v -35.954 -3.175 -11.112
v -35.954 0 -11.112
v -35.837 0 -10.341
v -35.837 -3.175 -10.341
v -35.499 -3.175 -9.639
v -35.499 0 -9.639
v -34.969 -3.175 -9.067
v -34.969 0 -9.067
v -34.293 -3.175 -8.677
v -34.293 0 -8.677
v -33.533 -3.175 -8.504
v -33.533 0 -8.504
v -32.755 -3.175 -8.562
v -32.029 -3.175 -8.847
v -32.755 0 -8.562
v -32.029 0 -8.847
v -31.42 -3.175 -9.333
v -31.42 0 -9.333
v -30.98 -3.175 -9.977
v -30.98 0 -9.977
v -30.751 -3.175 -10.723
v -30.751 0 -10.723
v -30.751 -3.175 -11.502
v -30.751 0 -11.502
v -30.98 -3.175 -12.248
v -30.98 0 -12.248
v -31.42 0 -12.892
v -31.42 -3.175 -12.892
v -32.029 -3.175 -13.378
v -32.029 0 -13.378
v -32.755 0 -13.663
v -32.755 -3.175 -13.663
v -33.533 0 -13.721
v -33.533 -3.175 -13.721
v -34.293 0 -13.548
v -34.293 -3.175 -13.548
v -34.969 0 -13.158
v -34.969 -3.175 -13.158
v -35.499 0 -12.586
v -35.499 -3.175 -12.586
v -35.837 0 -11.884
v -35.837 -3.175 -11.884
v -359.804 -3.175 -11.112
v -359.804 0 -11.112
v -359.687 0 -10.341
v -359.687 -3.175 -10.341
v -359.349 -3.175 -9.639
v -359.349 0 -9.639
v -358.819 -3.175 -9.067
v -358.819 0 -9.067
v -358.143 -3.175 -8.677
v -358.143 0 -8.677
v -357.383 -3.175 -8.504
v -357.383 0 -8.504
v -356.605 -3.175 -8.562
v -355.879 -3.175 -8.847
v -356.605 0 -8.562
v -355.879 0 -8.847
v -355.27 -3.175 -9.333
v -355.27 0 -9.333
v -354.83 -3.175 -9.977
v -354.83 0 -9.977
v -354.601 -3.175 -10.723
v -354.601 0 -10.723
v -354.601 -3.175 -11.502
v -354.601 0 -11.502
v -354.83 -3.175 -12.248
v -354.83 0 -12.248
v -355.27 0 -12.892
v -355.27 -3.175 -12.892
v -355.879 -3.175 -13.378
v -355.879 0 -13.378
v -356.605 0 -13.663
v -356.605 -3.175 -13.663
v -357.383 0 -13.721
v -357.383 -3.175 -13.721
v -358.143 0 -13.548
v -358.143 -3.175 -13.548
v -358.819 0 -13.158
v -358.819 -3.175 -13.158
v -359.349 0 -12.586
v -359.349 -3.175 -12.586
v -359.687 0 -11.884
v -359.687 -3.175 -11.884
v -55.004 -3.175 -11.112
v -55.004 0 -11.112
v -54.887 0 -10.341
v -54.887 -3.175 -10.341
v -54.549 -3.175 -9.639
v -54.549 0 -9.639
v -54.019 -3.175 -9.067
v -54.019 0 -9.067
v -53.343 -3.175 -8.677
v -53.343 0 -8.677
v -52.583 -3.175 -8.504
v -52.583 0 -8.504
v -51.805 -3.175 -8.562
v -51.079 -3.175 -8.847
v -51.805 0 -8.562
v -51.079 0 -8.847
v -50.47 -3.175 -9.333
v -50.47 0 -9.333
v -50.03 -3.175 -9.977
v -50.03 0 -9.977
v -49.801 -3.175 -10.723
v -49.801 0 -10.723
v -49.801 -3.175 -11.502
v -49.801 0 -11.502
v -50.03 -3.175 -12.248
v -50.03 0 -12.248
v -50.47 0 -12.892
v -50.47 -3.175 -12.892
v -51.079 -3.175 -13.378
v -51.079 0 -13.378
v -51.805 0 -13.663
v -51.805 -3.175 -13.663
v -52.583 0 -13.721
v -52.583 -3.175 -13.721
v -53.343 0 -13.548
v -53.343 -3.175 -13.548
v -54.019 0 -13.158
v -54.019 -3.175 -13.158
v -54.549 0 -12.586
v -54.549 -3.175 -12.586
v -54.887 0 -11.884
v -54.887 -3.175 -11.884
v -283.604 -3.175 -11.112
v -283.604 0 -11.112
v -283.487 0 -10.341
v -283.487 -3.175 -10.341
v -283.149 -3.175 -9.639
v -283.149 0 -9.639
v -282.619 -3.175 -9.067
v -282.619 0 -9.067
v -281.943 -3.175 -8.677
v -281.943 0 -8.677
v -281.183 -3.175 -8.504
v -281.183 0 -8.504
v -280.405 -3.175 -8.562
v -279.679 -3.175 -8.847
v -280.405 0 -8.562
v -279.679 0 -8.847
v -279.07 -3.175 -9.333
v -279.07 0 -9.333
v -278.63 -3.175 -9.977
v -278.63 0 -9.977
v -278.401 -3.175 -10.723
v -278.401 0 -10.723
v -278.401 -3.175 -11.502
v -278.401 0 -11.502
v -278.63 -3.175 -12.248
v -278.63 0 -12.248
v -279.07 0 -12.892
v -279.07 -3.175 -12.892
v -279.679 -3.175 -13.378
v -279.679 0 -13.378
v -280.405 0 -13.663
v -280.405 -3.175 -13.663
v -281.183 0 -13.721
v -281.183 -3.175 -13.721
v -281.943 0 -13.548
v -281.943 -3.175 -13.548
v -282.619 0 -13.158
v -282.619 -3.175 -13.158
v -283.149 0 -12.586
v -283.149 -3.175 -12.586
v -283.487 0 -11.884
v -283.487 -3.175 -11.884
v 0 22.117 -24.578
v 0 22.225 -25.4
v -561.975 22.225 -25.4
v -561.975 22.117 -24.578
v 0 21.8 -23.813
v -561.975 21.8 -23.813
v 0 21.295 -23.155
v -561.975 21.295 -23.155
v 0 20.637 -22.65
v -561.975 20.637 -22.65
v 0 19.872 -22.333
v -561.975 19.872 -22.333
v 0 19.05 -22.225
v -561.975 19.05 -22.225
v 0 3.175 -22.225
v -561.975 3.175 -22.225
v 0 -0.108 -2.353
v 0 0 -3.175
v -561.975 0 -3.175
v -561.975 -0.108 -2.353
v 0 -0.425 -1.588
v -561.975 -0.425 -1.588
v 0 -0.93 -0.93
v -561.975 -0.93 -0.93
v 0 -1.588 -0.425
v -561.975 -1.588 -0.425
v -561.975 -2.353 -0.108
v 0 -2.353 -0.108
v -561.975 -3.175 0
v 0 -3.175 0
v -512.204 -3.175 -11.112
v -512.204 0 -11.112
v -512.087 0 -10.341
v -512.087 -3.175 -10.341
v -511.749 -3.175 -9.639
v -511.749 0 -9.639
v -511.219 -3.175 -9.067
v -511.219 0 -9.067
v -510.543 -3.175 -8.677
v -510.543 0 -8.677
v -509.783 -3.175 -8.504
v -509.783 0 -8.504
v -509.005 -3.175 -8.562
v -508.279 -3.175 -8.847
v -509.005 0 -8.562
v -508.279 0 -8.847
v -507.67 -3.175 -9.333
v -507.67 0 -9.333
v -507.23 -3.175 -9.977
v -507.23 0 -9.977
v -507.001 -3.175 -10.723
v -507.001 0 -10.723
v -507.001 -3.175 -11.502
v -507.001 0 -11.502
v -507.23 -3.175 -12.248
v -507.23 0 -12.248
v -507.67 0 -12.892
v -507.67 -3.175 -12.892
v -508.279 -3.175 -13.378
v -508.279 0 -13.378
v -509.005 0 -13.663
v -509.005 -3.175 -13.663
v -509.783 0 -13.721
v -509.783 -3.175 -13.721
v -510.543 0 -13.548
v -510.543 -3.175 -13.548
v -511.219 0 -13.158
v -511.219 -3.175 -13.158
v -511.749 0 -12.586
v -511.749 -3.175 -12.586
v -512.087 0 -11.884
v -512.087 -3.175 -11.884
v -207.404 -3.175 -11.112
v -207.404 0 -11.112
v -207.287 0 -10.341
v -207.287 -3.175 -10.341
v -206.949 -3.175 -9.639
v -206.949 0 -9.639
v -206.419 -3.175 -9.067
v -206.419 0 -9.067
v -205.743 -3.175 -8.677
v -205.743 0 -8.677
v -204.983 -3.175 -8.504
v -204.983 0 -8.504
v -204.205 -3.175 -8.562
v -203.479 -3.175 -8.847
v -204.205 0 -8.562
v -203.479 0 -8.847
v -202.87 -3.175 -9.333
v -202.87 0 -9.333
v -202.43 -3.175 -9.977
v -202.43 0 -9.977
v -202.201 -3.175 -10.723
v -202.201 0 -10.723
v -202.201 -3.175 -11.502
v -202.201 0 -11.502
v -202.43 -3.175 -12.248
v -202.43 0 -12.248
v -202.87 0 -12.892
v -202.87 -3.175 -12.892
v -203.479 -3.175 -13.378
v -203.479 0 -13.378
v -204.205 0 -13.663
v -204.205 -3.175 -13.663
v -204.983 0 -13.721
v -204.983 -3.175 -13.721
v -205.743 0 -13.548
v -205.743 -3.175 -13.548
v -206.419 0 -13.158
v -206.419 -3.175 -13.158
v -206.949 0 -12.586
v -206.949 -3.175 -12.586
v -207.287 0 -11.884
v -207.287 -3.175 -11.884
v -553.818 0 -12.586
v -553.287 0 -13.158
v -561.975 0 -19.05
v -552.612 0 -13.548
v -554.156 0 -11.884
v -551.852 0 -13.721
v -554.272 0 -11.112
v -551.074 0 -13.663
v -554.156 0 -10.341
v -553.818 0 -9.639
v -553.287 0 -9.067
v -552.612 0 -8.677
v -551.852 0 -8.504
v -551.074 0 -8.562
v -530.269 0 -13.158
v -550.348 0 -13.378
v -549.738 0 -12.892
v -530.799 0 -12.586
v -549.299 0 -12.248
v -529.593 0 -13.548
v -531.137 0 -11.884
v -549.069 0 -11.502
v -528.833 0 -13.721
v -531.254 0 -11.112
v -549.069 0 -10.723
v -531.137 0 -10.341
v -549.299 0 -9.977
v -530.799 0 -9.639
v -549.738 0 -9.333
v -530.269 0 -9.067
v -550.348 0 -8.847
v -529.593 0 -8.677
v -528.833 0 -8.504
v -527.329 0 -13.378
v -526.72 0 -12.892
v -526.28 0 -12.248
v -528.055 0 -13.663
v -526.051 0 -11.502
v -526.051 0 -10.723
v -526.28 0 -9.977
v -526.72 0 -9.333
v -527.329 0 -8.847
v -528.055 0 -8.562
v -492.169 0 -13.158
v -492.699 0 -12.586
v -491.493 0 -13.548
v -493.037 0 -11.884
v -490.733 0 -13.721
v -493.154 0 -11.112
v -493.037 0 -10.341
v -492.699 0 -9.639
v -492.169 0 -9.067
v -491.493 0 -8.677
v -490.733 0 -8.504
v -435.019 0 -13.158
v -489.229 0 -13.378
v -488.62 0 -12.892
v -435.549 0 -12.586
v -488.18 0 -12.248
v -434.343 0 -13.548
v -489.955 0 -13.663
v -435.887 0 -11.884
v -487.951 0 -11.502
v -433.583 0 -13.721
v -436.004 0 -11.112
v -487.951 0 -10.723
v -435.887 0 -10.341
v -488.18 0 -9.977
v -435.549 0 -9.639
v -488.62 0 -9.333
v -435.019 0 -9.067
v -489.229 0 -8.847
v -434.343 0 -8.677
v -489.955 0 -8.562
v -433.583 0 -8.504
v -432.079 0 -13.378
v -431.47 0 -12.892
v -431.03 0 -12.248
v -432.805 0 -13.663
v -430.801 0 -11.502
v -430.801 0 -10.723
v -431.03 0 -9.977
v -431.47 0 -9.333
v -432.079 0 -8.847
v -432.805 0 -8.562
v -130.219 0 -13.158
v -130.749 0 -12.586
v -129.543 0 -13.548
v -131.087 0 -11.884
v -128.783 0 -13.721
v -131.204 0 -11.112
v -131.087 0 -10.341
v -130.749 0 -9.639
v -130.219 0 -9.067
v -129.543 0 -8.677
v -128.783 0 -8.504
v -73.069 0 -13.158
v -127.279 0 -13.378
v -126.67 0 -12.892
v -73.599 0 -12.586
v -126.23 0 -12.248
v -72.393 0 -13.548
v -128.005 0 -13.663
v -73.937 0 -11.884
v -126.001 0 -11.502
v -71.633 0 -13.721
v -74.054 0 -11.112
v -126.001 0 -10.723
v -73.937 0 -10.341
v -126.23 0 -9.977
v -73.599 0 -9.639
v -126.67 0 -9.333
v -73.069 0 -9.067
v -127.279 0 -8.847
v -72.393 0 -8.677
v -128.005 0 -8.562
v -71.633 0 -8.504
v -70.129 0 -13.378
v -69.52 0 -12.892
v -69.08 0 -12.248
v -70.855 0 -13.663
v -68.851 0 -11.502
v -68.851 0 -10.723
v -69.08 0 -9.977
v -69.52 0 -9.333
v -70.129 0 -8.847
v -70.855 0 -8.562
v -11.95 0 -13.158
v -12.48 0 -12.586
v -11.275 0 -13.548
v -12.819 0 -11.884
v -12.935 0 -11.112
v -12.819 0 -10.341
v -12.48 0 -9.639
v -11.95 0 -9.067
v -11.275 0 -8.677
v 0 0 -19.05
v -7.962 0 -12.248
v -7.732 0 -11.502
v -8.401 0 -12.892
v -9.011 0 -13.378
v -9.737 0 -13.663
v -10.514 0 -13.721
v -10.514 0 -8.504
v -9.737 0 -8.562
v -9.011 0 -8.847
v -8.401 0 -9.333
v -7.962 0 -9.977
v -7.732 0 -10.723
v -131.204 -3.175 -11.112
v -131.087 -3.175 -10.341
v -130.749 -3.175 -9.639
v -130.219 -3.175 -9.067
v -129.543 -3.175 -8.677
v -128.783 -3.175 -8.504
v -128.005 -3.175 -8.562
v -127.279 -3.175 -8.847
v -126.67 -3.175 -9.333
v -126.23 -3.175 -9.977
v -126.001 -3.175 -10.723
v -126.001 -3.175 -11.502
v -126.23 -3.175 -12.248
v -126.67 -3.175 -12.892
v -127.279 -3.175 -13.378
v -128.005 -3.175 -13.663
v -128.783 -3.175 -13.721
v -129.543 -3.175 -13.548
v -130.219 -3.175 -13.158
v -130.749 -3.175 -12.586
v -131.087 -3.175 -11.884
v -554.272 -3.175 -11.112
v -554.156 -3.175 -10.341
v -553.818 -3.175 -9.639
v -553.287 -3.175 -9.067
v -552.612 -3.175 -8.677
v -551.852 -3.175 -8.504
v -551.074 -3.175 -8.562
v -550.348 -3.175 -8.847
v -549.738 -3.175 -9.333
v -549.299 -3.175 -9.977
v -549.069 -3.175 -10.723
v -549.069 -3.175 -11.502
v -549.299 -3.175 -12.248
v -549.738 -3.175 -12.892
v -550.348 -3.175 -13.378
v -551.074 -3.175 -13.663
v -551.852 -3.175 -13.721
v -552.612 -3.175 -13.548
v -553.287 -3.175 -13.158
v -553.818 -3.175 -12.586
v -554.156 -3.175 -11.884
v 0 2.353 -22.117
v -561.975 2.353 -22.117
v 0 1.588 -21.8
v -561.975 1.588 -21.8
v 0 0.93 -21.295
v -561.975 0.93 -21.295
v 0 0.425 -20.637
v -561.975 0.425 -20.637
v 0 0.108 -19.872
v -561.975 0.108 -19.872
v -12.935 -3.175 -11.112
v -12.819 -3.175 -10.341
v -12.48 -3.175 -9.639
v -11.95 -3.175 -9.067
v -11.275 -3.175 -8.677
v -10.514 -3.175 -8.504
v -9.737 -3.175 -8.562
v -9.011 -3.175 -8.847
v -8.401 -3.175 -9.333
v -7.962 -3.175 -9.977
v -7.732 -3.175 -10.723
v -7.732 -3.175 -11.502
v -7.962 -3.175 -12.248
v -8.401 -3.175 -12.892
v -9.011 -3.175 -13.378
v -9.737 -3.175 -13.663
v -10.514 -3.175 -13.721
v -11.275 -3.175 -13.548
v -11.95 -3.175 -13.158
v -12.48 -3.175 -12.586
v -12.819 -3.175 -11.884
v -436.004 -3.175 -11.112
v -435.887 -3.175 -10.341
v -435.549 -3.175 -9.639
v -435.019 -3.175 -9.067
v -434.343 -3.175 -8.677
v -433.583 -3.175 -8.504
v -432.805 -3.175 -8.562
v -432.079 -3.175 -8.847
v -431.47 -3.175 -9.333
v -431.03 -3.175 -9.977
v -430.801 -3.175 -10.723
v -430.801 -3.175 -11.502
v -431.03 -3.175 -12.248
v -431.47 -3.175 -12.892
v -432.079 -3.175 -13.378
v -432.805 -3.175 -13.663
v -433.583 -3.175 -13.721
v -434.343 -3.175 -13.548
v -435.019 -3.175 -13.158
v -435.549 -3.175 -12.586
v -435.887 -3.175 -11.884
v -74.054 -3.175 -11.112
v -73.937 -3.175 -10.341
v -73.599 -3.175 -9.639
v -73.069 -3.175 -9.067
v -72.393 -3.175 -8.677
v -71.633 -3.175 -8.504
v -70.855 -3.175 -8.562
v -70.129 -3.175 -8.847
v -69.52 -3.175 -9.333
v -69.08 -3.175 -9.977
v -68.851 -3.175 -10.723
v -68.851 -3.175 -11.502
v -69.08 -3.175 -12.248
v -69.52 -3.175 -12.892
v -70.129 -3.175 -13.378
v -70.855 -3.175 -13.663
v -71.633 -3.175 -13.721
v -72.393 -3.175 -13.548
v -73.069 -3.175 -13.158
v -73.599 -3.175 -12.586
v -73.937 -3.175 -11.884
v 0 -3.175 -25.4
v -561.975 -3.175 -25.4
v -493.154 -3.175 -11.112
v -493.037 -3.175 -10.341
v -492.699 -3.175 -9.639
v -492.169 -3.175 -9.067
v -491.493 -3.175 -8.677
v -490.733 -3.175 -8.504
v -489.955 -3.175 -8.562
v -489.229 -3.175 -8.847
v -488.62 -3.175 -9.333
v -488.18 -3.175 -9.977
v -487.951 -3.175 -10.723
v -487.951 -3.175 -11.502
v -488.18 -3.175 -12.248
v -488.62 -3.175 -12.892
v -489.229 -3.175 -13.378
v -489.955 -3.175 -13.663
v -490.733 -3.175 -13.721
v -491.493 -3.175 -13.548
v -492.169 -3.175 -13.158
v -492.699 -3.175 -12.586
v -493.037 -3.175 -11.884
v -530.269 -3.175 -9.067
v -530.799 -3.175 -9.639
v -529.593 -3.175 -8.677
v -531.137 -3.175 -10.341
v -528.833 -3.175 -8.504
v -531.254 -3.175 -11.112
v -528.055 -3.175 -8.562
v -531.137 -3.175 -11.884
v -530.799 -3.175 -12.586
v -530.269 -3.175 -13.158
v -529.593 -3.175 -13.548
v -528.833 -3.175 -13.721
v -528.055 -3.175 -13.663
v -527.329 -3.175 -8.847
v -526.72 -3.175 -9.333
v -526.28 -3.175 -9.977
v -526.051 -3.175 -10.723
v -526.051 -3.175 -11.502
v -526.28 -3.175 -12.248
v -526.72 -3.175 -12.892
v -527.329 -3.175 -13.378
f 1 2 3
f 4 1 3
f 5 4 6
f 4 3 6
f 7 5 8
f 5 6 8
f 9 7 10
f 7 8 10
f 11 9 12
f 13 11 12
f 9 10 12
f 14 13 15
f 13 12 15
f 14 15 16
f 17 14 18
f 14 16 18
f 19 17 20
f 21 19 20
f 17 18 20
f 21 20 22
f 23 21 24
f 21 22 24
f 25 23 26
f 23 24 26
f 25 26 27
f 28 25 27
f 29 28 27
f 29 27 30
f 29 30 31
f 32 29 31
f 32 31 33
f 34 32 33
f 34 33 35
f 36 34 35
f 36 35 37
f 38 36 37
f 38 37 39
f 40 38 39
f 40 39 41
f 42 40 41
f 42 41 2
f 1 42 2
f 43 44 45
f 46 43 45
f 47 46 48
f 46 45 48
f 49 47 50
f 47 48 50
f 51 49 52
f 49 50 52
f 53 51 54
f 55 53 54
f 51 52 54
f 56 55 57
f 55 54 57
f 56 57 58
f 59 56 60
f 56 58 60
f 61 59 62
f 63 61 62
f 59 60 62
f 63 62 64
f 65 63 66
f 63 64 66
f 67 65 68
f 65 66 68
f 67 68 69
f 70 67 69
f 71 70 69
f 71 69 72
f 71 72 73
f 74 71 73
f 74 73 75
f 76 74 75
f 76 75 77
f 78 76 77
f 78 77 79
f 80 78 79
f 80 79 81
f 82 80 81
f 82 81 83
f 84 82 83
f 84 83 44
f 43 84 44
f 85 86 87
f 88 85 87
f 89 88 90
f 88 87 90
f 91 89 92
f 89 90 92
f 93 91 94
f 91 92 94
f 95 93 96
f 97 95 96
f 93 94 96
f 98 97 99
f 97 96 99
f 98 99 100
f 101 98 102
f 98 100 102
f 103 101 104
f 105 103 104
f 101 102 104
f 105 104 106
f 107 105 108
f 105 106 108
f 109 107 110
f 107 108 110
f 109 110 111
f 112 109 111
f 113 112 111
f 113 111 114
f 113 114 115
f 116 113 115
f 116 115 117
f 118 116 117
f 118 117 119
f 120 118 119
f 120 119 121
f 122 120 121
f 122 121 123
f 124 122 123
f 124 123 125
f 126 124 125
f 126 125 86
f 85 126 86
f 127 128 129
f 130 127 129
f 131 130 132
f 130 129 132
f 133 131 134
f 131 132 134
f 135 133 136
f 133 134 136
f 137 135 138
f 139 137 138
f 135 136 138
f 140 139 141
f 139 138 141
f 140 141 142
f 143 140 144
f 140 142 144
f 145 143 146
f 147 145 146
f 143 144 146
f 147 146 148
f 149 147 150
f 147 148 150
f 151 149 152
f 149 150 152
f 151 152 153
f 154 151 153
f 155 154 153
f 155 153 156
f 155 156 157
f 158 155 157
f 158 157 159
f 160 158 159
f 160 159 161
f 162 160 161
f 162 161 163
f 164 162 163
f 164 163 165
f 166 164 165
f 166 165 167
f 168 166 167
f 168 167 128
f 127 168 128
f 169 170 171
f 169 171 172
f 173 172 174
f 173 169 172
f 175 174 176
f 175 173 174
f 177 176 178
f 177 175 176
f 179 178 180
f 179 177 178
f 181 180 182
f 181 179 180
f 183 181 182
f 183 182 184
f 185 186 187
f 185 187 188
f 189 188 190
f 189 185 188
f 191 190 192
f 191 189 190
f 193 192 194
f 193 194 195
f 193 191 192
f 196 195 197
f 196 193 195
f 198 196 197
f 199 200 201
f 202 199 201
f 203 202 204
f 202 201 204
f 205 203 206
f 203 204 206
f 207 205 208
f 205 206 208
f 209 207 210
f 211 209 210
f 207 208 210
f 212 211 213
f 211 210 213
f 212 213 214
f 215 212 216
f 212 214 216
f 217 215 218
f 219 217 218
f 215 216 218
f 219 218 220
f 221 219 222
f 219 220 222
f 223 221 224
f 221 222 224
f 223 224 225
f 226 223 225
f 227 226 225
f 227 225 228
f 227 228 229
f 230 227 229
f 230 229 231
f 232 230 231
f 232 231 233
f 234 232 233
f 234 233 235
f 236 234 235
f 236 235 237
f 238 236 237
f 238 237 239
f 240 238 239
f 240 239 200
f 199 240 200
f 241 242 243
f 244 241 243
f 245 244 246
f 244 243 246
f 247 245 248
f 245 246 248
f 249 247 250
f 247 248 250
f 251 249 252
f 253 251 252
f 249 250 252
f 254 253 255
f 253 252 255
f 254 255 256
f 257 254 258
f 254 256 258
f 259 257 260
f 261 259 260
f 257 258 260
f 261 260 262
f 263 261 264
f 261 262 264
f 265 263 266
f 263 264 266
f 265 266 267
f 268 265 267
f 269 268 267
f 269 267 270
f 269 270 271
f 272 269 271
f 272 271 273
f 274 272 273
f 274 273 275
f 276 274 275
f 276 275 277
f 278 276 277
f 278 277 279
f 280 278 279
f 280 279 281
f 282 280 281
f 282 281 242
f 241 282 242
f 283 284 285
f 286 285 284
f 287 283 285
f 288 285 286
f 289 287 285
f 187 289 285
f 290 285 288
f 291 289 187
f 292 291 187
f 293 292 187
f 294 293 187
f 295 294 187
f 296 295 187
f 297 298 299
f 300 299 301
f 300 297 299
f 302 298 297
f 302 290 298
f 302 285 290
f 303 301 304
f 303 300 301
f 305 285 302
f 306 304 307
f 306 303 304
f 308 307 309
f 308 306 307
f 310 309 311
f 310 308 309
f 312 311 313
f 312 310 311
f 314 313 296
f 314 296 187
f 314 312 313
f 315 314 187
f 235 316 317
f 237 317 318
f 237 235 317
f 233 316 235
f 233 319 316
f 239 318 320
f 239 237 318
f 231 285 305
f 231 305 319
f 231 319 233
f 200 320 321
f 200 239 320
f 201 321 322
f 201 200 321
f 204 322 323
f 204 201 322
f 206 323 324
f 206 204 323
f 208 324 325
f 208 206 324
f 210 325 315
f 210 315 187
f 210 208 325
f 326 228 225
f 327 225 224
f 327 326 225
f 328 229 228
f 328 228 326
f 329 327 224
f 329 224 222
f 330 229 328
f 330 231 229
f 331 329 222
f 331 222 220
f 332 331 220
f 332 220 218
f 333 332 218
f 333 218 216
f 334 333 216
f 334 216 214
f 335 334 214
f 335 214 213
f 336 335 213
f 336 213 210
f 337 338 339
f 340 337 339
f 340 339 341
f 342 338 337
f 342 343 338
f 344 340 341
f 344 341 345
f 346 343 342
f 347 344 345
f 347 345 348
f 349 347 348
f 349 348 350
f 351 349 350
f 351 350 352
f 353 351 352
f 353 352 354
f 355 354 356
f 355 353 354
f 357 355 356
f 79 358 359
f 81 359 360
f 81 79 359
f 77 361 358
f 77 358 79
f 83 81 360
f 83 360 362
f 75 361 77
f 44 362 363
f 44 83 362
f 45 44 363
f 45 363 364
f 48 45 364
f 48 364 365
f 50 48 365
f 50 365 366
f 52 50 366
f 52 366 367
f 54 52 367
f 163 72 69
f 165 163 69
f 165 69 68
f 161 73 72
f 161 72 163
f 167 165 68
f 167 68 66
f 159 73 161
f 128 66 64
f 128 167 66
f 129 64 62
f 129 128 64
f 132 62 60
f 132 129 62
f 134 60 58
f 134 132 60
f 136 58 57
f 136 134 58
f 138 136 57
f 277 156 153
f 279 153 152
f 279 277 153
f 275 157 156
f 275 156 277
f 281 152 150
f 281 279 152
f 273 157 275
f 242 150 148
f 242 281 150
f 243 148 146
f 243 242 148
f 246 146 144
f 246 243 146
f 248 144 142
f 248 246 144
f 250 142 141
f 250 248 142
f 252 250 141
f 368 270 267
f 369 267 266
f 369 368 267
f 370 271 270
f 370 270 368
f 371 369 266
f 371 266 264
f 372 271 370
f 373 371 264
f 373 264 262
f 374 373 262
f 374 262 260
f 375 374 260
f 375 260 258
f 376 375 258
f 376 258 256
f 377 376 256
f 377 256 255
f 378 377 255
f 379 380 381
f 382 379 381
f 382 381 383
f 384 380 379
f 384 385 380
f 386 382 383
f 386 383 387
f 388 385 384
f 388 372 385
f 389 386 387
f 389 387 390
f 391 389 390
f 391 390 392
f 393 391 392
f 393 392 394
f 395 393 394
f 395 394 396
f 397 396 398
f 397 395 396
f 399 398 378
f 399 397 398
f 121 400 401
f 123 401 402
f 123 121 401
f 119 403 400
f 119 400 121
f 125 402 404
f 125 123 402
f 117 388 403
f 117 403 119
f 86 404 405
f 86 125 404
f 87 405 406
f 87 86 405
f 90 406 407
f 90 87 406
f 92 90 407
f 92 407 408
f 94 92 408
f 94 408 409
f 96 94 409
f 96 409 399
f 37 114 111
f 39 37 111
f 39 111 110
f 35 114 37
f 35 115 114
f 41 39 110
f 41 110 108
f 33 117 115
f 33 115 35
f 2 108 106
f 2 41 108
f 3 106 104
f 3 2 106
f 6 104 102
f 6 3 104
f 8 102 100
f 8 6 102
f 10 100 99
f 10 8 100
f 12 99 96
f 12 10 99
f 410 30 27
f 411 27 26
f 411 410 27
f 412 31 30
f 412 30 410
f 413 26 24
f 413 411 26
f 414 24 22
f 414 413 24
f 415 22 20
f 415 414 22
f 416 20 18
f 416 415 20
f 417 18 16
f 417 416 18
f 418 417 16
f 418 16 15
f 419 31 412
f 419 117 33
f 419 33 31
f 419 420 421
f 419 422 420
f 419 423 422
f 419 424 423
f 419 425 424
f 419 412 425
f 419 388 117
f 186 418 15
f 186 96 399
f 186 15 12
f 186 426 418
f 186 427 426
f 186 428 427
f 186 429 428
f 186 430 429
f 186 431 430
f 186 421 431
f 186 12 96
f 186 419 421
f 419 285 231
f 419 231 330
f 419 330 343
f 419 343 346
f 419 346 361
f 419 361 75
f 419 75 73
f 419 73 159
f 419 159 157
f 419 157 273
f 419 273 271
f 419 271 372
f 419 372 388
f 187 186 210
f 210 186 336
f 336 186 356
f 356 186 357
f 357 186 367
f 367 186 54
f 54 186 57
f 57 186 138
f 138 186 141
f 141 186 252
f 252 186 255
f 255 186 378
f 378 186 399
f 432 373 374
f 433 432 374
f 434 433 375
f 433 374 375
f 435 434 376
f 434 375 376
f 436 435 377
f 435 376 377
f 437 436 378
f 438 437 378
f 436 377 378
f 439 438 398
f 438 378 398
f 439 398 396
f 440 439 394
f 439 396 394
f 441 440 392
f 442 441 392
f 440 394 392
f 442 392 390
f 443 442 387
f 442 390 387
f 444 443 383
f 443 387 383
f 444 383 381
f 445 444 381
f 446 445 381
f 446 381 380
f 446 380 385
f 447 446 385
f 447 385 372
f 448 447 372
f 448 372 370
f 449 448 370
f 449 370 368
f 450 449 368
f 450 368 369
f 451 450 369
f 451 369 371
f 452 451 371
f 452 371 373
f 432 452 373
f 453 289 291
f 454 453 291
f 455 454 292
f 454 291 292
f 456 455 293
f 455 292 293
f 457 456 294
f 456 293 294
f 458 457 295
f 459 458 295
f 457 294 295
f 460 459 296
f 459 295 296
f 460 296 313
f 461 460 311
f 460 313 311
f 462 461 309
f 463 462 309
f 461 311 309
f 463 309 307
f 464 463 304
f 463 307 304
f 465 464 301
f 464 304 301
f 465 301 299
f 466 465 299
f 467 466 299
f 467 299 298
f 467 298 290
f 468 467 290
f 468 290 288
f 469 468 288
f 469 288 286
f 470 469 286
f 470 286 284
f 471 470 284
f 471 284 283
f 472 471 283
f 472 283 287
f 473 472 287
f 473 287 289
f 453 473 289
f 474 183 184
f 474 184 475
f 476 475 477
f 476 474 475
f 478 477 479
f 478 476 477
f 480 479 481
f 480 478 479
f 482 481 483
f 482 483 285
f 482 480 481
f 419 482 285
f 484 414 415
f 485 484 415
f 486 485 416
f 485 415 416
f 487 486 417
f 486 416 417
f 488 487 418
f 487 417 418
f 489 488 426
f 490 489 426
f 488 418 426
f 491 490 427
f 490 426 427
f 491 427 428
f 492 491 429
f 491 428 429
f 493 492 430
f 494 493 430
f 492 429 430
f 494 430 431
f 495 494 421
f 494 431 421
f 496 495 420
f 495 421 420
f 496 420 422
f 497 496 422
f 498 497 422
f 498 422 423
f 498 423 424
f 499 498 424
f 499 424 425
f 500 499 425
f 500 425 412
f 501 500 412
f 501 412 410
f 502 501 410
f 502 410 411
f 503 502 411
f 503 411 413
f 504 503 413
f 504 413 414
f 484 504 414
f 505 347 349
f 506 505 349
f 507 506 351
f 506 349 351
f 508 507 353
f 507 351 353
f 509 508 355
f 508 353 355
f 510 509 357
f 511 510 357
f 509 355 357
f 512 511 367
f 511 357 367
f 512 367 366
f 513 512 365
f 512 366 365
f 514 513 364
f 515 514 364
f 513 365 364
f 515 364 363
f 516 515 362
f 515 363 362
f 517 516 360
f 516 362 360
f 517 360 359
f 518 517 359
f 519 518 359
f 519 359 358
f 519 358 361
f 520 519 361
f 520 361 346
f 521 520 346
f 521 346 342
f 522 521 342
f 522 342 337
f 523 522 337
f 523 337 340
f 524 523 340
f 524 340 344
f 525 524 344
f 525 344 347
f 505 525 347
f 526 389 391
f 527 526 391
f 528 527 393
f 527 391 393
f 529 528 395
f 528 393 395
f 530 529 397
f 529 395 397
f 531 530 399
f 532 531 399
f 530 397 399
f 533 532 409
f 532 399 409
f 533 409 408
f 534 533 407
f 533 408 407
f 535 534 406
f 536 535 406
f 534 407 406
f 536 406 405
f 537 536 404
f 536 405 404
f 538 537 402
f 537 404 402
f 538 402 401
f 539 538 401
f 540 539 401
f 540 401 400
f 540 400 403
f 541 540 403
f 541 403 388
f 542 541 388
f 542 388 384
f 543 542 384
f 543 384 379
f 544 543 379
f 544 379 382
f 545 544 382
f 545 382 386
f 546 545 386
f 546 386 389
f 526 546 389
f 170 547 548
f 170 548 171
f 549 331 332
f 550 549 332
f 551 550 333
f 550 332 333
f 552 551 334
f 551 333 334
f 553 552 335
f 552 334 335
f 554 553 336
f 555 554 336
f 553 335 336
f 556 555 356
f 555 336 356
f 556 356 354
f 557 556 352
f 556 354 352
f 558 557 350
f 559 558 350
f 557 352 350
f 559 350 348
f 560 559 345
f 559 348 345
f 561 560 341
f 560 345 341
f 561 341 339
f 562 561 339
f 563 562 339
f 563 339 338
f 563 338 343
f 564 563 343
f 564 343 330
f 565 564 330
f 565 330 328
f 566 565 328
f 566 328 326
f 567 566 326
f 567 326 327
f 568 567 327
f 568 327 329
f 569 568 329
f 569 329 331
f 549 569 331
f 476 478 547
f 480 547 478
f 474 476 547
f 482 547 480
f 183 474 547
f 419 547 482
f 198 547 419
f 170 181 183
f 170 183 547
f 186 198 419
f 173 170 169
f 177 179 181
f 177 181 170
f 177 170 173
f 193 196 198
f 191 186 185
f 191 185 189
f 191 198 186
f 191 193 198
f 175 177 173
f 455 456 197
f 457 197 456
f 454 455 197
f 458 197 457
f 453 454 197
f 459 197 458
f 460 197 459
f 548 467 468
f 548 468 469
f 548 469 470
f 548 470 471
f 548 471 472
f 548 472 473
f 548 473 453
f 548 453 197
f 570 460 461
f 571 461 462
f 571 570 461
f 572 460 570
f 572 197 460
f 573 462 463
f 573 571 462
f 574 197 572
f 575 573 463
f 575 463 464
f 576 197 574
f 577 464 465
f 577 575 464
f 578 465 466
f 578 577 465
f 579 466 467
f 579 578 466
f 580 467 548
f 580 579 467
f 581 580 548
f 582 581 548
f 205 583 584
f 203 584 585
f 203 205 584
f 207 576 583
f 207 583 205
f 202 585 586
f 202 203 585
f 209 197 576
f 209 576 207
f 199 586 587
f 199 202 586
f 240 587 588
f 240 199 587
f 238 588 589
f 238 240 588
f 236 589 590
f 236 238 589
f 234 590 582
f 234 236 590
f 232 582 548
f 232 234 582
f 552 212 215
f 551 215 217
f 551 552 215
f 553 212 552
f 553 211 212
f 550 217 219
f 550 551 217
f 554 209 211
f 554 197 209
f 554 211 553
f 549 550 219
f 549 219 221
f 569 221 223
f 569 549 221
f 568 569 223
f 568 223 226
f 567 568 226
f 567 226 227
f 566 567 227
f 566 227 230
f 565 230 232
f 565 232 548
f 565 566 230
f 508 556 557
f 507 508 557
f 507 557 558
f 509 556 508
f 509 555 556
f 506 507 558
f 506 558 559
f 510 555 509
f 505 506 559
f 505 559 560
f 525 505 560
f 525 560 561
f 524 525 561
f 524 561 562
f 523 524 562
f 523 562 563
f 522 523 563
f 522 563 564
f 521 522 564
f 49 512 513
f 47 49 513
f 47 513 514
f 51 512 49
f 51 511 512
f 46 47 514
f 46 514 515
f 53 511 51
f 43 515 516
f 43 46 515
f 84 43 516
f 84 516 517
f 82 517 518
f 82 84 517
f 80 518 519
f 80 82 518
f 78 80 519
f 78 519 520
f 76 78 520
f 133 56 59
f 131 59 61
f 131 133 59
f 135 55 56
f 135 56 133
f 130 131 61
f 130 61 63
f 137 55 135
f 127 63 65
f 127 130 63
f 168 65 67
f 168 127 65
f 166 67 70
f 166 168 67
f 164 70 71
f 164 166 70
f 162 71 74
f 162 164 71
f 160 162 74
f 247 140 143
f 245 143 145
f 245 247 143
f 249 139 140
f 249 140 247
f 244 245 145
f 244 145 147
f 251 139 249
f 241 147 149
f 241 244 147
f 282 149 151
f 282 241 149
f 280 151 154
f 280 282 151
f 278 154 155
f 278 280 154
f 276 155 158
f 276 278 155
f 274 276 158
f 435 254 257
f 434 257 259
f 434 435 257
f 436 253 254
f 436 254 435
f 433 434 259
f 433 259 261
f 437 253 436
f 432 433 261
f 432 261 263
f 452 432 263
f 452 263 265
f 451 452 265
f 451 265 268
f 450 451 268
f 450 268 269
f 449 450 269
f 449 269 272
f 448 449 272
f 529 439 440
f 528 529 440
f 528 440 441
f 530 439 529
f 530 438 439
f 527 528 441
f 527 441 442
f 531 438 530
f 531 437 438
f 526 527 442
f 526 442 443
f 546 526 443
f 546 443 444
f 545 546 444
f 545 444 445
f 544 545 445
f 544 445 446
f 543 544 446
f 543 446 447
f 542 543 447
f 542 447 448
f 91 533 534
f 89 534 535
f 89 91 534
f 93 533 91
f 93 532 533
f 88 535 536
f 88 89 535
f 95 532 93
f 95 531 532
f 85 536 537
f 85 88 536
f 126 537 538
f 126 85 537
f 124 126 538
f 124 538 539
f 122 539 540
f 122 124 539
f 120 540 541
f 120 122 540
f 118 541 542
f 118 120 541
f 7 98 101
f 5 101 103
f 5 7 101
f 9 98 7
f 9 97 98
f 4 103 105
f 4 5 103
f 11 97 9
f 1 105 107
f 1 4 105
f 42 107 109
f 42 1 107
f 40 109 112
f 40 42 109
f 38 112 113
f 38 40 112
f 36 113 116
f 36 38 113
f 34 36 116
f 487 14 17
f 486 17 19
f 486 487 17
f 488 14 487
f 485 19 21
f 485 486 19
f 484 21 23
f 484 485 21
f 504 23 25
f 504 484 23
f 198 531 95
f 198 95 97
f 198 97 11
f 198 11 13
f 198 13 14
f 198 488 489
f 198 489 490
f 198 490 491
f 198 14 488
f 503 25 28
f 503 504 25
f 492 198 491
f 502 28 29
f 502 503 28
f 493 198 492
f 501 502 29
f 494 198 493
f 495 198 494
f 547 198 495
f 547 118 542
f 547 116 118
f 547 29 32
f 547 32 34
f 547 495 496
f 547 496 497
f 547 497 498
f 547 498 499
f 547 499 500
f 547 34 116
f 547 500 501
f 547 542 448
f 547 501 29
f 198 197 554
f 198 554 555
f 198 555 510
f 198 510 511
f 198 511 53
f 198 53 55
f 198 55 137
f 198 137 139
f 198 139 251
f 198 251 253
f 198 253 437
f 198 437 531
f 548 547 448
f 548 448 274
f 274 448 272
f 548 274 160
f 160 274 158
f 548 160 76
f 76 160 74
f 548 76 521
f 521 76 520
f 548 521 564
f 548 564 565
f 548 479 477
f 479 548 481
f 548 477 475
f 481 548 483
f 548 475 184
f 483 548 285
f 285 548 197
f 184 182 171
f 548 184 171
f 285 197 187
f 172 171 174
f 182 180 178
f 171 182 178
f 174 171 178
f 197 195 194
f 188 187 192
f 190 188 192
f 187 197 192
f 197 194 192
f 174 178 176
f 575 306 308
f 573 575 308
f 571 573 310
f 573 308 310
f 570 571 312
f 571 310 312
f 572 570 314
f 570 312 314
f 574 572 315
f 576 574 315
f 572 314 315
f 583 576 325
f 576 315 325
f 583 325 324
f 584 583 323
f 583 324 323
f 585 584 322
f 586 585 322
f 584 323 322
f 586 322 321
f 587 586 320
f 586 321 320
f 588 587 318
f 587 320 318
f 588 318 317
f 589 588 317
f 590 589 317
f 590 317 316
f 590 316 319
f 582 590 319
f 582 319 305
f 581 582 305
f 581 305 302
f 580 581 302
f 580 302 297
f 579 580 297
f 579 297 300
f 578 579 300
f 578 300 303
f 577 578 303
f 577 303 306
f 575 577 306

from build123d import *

# Parameters (mm, degrees)
F1_DEPTH = 561.975
F2_R     = 2.6162
F3_DEPTH = 25.4


with BuildPart() as f1:
    # F0 (on Right) → F1 (new body)
    with BuildSketch(Plane.YZ):
        with BuildLine():
            Line((0, -19.05), (0, -3.175))
            ThreePointArc((0, -3.175), (-0.929936, -0.929936), (-3.175, 0))
            Line((-3.175, 0), (-3.175, -25.4))
            Line((-3.175, -25.4), (22.225, -25.4))
            ThreePointArc((22.225, -25.4), (21.295064, -23.154936), (19.05, -22.225))
            Line((19.05, -22.225), (3.175, -22.225))
            ThreePointArc((3.175, -22.225), (0.929936, -21.295064), (0, -19.05))
        make_face()
    extrude(amount=-F1_DEPTH)

    # F2 (on face) → F3 (cut)
    with BuildSketch(Plane(origin=(0, 0, 0), x_dir=(-1, 0, 0), z_dir=(0, 1, 0))):
        with Locations((10.31875, -11.1125)):
            Circle(F2_R)
        with Locations((280.9875, -11.1125)):
            Circle(F2_R)
        with Locations((551.65625, -11.1125)):
            Circle(F2_R)
        with Locations((128.5875, -11.1125)):
            Circle(F2_R)
        with Locations((204.7875, -11.1125)):
            Circle(F2_R)
        with Locations((357.1875, -11.1125)):
            Circle(F2_R)
        with Locations((433.3875, -11.1125)):
            Circle(F2_R)
        with Locations((509.5875, -11.1125)):
            Circle(F2_R)
        with Locations((52.3875, -11.1125)):
            Circle(F2_R)
        with Locations((33.3375, -11.1125)):
            Circle(F2_R)
        with Locations((71.4375, -11.1125)):
            Circle(F2_R)
        with Locations((490.5375, -11.1125)):
            Circle(F2_R)
        with Locations((528.6375, -11.1125)):
            Circle(F2_R)
    extrude(amount=-F3_DEPTH, mode=Mode.SUBTRACT)


solid = f1.part
